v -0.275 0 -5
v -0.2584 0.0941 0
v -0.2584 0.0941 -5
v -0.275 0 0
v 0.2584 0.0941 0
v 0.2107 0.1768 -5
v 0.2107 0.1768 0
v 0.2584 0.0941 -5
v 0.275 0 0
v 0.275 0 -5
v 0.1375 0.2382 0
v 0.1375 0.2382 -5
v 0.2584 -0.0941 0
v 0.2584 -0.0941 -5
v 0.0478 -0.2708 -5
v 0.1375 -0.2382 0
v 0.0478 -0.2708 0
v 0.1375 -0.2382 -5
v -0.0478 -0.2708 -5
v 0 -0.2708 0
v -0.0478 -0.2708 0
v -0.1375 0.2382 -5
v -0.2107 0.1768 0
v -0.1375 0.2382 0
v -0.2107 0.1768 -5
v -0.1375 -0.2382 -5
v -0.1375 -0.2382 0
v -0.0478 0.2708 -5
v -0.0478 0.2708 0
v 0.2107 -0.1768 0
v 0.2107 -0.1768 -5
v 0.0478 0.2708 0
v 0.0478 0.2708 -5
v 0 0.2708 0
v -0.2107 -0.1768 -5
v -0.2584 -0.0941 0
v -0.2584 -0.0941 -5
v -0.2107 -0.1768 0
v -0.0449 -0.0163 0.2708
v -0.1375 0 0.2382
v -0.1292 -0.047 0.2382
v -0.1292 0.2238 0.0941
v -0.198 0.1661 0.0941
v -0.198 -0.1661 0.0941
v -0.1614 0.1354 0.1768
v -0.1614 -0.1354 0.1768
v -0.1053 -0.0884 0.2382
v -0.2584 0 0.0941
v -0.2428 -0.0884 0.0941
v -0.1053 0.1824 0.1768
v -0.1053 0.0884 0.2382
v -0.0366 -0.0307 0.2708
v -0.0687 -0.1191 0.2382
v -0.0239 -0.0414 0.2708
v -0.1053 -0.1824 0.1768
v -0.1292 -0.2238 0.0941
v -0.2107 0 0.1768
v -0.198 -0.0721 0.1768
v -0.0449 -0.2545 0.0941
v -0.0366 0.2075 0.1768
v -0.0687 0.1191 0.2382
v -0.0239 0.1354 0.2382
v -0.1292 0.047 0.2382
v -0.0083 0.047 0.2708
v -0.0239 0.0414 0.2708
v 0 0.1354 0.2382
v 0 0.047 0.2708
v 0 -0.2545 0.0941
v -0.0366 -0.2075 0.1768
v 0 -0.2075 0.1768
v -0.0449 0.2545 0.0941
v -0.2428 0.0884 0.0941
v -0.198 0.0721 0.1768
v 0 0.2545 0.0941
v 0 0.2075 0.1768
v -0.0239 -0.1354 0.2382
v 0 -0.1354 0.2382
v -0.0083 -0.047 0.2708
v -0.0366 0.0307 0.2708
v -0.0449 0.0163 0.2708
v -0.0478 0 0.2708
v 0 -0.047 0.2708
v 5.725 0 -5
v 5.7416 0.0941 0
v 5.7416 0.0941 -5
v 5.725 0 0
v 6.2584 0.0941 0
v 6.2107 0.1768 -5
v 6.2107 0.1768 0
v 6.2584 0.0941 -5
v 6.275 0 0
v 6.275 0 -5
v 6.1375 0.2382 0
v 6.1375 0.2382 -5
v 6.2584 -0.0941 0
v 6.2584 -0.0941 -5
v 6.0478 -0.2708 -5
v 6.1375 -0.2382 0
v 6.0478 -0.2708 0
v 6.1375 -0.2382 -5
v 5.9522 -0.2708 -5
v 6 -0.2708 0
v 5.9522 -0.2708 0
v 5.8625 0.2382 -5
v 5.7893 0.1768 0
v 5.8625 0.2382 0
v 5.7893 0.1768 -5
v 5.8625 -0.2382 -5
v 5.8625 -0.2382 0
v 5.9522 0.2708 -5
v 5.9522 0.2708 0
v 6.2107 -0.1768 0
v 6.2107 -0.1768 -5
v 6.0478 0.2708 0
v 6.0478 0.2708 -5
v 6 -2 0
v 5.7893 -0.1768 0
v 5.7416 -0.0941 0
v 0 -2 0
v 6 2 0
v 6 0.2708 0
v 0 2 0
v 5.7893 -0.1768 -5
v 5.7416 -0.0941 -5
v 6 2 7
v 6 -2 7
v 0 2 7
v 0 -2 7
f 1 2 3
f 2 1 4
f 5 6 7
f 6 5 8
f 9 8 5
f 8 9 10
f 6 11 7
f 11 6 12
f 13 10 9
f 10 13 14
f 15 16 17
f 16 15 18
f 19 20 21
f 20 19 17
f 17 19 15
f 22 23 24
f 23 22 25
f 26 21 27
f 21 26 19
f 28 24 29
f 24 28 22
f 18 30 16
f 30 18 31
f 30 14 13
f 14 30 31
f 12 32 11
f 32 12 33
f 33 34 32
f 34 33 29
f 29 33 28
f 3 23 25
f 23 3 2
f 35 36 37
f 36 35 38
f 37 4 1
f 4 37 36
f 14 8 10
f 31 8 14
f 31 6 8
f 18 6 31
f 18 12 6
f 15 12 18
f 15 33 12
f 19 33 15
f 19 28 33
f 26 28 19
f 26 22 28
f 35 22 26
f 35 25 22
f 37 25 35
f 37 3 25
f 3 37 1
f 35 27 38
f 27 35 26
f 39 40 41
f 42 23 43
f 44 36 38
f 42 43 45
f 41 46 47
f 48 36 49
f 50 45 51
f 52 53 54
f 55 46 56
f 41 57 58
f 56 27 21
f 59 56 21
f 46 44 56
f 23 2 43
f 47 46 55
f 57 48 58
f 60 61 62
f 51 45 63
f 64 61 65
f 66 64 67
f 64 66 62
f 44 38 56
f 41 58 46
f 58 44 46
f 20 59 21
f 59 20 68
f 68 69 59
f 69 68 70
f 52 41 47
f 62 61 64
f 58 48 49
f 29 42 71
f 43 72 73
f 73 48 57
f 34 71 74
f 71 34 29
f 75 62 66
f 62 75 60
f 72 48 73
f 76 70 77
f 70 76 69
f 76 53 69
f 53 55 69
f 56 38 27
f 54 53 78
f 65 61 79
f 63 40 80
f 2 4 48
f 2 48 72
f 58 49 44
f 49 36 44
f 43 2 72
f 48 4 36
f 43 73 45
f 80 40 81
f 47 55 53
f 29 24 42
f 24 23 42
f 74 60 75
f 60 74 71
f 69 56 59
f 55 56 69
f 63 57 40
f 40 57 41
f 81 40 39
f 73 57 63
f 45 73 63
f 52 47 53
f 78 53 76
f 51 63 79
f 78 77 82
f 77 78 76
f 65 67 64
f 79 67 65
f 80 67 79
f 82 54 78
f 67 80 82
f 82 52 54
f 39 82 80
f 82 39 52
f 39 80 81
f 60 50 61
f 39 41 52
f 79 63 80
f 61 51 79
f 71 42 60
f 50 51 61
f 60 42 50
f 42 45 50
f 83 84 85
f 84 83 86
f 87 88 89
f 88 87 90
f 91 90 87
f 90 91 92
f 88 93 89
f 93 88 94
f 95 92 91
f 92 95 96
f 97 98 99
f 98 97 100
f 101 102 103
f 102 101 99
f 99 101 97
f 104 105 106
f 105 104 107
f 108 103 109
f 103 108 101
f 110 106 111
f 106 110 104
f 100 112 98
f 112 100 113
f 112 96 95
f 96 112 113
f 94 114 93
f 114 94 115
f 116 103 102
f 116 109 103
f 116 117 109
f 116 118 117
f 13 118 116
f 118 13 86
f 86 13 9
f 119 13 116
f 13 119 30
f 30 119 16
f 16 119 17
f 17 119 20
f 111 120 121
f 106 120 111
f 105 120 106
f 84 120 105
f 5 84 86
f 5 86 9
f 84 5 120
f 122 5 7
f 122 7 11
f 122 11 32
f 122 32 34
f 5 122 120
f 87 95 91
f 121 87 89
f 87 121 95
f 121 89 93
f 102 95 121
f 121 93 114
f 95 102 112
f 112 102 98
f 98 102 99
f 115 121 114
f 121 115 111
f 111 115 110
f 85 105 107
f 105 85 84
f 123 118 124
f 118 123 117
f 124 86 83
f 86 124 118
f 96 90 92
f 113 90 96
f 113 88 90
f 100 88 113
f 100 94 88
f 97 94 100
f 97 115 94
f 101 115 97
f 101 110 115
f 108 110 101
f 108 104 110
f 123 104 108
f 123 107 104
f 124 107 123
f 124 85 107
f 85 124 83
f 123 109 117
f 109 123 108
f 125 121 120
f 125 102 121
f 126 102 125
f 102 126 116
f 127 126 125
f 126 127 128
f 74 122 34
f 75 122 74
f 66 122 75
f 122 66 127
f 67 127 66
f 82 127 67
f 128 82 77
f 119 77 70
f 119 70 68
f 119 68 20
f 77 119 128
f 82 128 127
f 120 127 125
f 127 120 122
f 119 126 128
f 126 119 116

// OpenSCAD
// TDK Corporation
// FCR24.0M6T
// Ceramic Resonator, 24MHz, 2 pin
// http://search.digikey.com/scripts/DkSearch/dksus.dll?Detail&name=445-2571-1-ND
// http://www.tdk.co.jp/tefe02/ef32_fcr.pdf

fcr_m6_render_part=1;

module fcr_m6(
	pinColor=[192/255,192/255,0]
        , bodyColor=[0.0,0.5,1.0]
  ) {
  $fs=0.1;
  $fa=15;
  // pin 1
  color(pinColor) {
    translate([0,0,-5.0])
      cylinder(r=0.55/2,h=5.0,center=false);
    sphere(r=0.55/2);
  }
  // pin 2
  color(pinColor) {
    translate([6.0,0,-5.0])
      cylinder(r=0.55/2,h=5.0,center=false);
    sphere(r=0.55/2);
  }
  // body
  color(bodyColor) translate([0,-2.0,0])
    cube(size=[6.0,4.0,7.0], center=false);
}

if( fcr_m6_render_part==1 ) {
  echo("Rendering fcr_m6...");
  fcr_m6();
}
